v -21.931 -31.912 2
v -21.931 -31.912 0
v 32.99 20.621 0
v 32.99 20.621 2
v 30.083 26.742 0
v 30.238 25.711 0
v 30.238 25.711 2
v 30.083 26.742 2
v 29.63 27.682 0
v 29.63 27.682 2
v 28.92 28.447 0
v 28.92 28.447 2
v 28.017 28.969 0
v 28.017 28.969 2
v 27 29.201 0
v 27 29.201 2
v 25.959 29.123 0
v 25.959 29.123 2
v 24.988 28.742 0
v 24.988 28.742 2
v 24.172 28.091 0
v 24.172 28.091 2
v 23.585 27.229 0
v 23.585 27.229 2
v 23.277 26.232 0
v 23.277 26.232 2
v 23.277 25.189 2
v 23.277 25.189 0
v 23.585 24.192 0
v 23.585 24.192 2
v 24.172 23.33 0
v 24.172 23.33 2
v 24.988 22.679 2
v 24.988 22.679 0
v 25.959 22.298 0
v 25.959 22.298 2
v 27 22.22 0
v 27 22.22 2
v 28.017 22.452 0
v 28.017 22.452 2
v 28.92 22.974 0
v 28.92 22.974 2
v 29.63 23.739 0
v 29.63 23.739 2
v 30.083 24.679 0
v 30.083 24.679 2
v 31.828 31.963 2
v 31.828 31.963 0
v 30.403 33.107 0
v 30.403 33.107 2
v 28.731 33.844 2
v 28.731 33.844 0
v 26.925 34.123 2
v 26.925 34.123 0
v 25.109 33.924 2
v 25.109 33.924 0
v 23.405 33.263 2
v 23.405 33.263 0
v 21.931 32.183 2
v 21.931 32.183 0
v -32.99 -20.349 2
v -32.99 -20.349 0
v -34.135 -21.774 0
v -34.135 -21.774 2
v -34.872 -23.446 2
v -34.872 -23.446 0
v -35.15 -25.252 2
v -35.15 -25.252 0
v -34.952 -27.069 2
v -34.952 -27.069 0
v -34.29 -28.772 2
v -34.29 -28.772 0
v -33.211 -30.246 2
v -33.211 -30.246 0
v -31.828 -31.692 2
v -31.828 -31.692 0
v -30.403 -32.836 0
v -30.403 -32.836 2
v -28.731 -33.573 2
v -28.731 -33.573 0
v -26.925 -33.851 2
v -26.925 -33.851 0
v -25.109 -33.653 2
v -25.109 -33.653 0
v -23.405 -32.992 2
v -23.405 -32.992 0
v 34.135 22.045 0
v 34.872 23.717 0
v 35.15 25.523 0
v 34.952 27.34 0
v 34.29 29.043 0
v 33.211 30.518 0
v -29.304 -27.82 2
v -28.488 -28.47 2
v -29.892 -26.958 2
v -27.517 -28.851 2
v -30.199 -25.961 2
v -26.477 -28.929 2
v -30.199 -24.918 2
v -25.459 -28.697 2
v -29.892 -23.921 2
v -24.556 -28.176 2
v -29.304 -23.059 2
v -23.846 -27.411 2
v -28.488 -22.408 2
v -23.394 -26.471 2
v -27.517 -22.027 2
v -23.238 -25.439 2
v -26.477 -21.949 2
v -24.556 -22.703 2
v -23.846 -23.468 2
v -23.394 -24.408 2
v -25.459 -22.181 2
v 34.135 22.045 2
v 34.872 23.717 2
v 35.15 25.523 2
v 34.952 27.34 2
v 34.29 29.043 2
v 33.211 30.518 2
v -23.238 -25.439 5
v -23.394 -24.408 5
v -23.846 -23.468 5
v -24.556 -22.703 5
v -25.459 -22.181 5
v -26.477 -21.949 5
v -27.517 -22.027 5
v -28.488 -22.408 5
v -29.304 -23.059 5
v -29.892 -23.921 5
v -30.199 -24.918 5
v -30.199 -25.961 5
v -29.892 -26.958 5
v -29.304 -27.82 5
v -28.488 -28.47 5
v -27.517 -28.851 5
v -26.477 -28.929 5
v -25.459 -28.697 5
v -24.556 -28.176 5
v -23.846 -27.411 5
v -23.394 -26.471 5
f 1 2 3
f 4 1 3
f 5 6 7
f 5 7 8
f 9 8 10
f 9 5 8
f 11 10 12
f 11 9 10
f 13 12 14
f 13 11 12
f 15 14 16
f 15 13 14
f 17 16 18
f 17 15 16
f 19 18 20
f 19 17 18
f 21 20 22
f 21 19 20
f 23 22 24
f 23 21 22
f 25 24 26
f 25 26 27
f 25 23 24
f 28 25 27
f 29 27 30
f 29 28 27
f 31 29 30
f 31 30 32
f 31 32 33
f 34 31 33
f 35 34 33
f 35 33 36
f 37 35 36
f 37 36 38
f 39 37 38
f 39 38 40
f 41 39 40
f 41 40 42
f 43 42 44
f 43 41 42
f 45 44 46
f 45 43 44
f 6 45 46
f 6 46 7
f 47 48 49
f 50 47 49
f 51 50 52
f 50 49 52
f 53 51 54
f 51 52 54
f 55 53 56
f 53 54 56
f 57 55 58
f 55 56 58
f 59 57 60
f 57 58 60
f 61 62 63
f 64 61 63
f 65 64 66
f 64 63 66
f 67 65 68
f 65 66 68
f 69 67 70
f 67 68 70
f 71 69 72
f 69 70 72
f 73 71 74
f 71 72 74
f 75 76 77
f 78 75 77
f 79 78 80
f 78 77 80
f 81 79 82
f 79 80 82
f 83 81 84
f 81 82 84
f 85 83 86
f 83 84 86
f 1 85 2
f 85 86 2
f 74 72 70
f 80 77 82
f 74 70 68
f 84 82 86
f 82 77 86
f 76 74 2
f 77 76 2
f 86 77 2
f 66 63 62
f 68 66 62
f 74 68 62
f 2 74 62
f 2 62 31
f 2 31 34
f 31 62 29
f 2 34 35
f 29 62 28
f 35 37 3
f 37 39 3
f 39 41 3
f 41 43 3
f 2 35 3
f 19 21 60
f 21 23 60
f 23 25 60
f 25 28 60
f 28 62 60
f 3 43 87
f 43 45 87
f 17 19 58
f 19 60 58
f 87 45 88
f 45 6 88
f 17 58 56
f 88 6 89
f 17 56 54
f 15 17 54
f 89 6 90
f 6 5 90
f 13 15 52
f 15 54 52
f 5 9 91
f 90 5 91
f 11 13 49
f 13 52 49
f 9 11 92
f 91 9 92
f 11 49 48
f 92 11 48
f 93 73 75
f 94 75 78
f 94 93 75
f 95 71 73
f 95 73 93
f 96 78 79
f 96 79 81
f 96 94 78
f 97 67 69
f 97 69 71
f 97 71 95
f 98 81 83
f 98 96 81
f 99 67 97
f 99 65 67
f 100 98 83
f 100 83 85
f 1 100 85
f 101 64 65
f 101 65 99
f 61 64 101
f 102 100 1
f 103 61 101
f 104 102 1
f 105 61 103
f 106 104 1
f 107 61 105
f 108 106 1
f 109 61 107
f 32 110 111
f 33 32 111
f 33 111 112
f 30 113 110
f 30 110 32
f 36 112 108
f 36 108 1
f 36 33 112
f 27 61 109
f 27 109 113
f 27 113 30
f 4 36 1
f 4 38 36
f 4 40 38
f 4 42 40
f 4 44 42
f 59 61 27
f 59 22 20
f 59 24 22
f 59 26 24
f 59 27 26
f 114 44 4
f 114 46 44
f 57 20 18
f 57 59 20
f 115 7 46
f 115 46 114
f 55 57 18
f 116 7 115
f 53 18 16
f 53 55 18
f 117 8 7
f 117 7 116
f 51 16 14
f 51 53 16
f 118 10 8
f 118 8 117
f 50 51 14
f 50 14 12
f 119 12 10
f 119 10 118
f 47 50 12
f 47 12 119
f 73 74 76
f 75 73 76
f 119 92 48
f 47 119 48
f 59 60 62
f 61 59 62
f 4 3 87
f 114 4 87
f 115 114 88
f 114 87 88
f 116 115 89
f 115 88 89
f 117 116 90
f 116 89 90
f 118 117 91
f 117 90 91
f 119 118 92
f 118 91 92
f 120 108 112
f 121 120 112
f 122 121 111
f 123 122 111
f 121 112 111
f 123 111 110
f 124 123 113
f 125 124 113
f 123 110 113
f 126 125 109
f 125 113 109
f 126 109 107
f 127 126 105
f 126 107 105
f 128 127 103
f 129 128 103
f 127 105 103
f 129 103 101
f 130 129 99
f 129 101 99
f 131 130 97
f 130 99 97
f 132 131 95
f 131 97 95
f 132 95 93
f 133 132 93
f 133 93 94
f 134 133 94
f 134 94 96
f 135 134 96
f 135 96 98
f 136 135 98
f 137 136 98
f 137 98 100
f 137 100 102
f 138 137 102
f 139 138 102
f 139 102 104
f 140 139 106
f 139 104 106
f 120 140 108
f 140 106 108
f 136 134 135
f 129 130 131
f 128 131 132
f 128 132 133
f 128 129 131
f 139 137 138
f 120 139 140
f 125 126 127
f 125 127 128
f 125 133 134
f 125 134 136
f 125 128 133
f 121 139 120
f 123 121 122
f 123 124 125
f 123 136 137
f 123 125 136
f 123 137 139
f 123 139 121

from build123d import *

# Parameters (mm, degrees)
SKETCH1_R           = 3.5
BOSS_EXTRUDE2_DEPTH = 2
SKETCH2_R           = 3.5
BOSS_EXTRUDE3_DEPTH = 3


with BuildPart() as part:
    # Sketch1 → Boss-Extrude2 (new body)
    with BuildSketch(Plane.XY):
        with BuildLine():
            ThreePointArc((31.828129573, 31.962855422), (26.925185535, 34.12264134), (21.93108129, 32.182935631))
            Line((21.93108129, 32.182935631), (-32.990473375, -20.349176769))
            ThreePointArc((-32.990473375, -20.349176769), (-35.150259292, -25.252120806), (-33.210553583, -30.246225051))
            Line((-33.210553583, -30.246225051), (-31.828129573, -31.691529121))
            ThreePointArc((-31.828129573, -31.691529121), (-26.925185535, -33.851315038), (-21.93108129, -31.91160933))
            Line((-21.93108129, -31.91160933), (32.990473375, 20.62050307))
            ThreePointArc((32.990473375, 20.62050307), (35.150259292, 25.523447107), (33.210553583, 30.517551352))
            Line((33.210553583, 30.517551352), (31.828129573, 31.962855422))
        make_face()
        with Locations((26.738125297, 25.710507345)):
            Circle(SKETCH1_R, mode=Mode.SUBTRACT)
    extrude(amount=BOSS_EXTRUDE2_DEPTH)

    # Sketch2 → Boss-Extrude3 (add)
    with BuildSketch(Plane.XY.offset(2)):
        with Locations((-26.738125297, -25.439181044)):
            Circle(SKETCH2_R)
    extrude(amount=BOSS_EXTRUDE3_DEPTH)


solid = part.part
